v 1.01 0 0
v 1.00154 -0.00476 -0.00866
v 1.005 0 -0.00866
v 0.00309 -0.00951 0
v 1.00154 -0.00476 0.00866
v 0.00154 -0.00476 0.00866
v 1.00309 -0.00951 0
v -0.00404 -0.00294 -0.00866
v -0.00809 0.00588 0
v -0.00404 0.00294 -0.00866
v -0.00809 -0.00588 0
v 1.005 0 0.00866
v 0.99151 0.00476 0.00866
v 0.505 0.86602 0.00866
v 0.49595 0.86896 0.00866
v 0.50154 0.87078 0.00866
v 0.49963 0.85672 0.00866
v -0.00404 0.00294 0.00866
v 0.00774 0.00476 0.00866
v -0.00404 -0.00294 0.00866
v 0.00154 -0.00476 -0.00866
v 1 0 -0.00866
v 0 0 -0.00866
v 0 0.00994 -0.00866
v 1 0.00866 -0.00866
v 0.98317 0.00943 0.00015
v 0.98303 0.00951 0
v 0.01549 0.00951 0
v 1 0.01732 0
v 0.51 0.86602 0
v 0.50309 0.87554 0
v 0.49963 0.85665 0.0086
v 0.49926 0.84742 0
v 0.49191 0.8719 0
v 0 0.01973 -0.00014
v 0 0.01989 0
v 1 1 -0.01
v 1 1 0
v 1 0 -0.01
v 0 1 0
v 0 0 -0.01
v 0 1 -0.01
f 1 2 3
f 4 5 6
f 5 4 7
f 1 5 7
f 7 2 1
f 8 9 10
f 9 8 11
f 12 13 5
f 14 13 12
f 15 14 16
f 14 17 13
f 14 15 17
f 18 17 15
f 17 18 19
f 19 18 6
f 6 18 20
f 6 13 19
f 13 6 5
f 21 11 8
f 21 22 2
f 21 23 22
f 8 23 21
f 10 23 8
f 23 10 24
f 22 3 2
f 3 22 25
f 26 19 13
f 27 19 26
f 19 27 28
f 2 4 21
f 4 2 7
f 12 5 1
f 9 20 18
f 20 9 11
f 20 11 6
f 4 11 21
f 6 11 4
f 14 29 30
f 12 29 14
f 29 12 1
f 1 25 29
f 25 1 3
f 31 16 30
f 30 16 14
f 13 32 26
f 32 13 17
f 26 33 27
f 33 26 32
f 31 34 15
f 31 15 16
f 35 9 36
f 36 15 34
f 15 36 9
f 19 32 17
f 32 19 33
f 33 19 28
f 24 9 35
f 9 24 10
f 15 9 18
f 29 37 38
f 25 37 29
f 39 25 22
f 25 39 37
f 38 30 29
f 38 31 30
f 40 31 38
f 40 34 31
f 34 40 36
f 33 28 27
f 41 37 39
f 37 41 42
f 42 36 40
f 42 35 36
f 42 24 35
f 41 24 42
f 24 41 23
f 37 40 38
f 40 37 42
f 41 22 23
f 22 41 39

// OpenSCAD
hull(){
    translate([0, 0]) sphere(0.01);
    translate([1, 0]) sphere(0.01);
}
hull(){
    translate([1, 0]) sphere(0.01);
    translate([0.5, 0.866025404]) sphere(0.01);
}
hull(){
    translate([0.5, 0.866025404]) sphere(0.01);
    translate([0, 0]) sphere(0.01);
}
translate([0,0,-0.01]) color([0.1,0.1,0.1]) cube([1,1,0.01]);
